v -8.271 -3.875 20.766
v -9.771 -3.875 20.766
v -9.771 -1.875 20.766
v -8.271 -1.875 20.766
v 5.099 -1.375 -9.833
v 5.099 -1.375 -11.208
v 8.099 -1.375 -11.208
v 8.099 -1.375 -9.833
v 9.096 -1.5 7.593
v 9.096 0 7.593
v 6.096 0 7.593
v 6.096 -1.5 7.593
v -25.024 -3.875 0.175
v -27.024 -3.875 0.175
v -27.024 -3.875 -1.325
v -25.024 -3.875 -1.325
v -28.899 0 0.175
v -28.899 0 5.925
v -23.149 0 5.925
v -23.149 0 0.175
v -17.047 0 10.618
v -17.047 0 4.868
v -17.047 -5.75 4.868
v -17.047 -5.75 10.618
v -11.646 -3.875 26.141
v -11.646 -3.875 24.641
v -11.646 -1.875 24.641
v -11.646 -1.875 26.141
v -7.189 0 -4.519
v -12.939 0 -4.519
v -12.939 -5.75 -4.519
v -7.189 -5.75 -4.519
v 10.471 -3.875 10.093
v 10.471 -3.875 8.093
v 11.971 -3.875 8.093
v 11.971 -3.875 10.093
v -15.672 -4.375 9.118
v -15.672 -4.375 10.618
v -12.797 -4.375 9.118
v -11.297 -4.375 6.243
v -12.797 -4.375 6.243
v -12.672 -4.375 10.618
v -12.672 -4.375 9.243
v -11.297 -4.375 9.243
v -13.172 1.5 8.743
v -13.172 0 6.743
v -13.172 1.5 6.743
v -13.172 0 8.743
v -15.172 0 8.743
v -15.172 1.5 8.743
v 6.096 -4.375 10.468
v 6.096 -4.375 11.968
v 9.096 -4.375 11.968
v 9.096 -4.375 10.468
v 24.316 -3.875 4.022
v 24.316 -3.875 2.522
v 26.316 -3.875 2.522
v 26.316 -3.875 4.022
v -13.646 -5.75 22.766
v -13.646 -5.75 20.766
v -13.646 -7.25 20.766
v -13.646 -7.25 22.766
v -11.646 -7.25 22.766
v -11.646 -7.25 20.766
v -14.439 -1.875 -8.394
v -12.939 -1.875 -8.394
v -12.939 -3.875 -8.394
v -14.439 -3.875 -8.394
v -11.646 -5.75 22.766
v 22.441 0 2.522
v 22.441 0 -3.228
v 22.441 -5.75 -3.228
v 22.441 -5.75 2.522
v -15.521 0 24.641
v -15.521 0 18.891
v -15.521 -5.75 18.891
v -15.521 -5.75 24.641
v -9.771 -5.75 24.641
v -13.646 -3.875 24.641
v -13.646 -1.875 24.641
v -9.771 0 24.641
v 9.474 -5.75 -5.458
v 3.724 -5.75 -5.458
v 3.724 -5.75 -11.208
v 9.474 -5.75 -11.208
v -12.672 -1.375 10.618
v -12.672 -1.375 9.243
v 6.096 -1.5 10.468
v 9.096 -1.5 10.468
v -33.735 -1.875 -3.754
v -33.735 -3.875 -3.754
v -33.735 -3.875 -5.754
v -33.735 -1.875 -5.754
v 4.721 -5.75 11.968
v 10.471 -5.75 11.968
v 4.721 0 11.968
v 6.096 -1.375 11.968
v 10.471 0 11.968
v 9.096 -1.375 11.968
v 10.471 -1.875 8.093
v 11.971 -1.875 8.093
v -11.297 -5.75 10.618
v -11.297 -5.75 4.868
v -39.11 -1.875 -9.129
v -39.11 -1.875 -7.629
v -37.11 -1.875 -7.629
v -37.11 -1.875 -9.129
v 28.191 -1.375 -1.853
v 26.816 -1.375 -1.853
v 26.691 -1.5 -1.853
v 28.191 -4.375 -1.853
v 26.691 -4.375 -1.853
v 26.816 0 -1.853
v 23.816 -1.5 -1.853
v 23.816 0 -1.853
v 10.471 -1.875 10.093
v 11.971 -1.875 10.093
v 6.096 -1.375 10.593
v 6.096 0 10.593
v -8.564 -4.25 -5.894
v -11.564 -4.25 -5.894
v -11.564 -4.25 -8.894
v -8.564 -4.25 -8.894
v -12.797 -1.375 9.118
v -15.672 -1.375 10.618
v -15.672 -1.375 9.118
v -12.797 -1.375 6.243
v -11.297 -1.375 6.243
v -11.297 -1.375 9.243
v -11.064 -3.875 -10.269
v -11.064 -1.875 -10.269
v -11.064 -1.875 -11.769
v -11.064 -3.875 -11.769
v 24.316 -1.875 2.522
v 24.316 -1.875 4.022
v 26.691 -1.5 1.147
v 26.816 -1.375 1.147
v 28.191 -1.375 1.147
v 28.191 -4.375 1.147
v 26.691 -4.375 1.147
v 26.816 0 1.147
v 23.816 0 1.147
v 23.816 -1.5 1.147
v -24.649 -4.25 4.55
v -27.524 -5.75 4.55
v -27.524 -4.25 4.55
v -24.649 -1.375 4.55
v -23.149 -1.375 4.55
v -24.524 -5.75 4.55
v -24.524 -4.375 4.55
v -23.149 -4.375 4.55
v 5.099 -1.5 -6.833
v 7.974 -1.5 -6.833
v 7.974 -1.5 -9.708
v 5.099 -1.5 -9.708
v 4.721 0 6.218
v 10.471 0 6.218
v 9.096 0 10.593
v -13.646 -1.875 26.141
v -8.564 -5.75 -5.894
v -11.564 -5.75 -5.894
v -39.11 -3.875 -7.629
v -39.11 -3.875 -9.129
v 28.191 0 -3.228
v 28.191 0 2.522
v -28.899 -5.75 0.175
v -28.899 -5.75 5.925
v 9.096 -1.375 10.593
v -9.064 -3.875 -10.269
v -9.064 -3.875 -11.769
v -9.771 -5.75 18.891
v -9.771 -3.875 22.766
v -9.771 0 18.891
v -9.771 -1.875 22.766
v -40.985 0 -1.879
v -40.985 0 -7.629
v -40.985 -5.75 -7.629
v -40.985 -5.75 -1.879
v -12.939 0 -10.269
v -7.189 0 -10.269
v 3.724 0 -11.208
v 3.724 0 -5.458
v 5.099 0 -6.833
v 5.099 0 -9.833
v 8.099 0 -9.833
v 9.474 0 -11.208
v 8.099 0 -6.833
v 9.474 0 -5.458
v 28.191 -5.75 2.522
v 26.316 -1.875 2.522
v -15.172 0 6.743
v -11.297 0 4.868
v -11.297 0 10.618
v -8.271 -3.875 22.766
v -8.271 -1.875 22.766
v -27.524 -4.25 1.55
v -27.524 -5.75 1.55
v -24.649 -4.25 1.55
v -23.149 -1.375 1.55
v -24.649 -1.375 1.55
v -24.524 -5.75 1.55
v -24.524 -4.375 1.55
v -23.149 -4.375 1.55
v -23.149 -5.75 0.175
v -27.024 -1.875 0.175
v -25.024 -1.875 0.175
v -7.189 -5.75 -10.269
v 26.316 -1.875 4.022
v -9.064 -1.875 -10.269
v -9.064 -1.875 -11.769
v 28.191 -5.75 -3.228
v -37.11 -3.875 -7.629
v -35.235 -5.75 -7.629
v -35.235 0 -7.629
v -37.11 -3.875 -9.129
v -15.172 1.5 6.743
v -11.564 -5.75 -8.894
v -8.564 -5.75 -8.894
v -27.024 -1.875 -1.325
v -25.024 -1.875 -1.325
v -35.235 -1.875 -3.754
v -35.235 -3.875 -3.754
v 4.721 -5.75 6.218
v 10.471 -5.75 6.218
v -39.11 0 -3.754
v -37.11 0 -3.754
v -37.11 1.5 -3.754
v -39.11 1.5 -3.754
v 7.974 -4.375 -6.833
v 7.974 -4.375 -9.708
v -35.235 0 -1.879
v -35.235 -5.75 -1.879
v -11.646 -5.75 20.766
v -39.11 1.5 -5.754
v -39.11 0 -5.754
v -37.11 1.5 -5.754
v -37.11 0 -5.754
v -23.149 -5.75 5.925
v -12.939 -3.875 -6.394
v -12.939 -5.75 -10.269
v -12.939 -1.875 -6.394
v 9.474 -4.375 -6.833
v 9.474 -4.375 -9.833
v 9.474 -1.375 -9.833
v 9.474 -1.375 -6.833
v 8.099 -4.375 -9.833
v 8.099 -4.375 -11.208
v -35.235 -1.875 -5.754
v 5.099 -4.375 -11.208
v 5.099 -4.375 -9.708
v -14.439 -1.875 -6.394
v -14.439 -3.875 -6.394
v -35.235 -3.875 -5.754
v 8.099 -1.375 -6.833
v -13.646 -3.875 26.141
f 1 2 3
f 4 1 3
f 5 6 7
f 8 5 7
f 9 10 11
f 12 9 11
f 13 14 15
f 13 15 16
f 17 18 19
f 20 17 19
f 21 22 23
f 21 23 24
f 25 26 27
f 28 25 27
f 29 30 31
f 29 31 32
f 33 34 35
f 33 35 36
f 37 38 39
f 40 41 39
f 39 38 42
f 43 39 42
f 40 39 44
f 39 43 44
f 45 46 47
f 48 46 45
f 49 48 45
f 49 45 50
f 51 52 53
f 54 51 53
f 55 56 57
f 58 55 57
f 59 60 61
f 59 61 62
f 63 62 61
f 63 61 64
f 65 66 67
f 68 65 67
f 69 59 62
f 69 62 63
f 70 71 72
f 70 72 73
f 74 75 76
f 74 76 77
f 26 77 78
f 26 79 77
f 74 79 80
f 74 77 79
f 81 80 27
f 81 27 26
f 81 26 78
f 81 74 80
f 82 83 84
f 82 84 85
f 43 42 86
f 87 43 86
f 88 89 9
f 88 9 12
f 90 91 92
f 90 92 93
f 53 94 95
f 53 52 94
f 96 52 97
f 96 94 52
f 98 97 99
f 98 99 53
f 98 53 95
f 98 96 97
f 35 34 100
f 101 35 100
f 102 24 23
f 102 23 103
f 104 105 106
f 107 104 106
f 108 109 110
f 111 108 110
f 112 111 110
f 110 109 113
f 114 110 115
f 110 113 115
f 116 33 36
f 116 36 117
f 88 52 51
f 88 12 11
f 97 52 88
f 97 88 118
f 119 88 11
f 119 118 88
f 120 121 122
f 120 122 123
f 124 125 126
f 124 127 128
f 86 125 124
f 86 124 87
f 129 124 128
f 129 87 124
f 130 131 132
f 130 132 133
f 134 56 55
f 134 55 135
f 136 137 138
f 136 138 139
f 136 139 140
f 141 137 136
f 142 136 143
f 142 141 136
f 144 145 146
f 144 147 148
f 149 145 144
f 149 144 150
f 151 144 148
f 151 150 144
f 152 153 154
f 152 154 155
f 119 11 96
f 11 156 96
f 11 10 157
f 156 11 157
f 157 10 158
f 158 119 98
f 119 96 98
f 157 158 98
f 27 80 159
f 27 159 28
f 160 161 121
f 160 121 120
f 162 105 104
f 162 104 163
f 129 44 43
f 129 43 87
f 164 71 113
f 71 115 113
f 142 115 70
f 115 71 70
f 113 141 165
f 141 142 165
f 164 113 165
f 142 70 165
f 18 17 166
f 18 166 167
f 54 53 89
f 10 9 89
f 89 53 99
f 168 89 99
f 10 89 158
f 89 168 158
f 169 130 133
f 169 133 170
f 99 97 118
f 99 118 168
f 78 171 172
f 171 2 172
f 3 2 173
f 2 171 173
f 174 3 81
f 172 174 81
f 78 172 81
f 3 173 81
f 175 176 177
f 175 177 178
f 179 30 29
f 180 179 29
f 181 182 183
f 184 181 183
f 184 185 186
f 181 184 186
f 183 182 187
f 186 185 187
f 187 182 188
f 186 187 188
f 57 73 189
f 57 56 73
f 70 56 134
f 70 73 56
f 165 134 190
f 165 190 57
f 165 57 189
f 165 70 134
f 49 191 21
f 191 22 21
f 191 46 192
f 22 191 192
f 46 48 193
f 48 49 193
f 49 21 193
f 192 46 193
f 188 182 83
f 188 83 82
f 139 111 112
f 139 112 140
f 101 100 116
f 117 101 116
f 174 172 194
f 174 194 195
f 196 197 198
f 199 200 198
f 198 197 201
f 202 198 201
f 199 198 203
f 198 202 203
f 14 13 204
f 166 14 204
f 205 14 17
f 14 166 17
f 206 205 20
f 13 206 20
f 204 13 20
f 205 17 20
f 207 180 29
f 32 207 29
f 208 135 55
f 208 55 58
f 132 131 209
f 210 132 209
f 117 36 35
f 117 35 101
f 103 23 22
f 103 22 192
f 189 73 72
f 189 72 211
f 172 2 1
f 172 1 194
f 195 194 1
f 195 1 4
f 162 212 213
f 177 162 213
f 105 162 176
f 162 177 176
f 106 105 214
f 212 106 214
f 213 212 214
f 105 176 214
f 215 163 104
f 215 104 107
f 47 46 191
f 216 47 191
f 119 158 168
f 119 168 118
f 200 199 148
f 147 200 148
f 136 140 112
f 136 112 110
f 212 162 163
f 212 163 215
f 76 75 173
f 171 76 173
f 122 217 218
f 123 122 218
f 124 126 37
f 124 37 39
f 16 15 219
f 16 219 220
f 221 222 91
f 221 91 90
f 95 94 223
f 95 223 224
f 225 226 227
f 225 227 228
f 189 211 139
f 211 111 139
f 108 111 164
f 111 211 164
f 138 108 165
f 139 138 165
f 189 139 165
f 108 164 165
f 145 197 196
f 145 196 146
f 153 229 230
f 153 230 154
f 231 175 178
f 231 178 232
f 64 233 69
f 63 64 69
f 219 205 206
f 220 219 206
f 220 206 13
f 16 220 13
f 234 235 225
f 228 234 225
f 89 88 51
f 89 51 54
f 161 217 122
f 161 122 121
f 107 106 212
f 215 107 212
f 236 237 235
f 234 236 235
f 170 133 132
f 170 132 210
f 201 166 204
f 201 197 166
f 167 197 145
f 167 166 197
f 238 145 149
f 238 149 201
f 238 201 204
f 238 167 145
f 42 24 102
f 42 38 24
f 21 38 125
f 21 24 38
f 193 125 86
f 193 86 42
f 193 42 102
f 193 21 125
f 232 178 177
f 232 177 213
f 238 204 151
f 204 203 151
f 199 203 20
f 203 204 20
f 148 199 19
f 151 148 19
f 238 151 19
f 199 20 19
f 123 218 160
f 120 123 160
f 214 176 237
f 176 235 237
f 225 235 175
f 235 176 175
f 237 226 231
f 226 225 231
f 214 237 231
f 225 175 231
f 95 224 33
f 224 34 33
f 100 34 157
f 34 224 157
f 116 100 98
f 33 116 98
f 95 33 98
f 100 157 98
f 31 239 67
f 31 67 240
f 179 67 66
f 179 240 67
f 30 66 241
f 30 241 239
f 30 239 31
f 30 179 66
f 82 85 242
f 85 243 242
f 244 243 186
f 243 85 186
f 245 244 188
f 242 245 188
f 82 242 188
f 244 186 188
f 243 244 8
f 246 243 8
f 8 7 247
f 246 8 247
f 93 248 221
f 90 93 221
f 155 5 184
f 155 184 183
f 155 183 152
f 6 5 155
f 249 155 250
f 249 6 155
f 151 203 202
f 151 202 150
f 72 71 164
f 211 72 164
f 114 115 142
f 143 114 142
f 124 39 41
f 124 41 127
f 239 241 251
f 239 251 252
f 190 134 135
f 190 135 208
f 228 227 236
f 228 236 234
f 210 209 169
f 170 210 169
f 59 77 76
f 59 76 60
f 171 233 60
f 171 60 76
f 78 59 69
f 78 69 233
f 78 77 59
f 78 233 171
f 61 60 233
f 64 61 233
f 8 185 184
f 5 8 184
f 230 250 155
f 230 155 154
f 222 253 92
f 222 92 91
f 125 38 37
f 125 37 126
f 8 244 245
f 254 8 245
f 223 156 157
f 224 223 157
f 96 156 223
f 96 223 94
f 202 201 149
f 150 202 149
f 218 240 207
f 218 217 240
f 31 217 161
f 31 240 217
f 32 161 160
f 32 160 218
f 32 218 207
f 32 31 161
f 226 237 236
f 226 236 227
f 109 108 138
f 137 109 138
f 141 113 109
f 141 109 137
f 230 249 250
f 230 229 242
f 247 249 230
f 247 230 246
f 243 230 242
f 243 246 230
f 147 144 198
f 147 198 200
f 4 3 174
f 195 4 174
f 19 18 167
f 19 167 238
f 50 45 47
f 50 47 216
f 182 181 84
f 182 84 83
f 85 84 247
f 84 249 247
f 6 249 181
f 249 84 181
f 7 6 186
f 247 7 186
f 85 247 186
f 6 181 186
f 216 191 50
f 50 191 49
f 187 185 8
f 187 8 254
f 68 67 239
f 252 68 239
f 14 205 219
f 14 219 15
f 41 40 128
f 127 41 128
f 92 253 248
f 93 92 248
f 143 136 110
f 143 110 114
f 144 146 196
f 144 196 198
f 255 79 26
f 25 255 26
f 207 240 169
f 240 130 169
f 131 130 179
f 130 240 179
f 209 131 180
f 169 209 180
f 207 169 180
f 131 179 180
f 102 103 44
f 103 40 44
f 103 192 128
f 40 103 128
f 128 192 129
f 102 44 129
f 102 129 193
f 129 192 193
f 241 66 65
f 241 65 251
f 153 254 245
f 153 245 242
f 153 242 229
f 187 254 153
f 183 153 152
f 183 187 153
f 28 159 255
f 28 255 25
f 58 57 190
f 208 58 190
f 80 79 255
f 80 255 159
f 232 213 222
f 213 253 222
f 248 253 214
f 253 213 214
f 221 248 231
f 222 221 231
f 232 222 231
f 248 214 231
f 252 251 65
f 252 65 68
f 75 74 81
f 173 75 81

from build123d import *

# Parameters (mm, degrees)
F0_W      = 5.75
F0_H      = 5.75
F1_DEPTH  = 5.75
F2_W      = 3
F2_H      = 3
F4_DEPTH  = 1.5
F3_W      = 2
F3_H      = 2
F5_DEPTH  = 1.5
F6_W      = 3
F6_H      = 3
F7_DEPTH  = 1.5
F8_W      = 2
F8_H      = 2
F9_DEPTH  = 1.5
F10_W     = 2
F10_H     = 2
F11_DEPTH = 1.5
F12_W     = 2
F12_H     = 2
F13_DEPTH = 1.5
F14_W     = 3
F14_H     = 3
F15_DEPTH = 1.5
F16_W     = 2
F16_H     = 2
F17_DEPTH = 1.5
F18_W     = 2
F18_H     = 2
F19_DEPTH = 1.5
F20_W     = 3
F20_H     = 3
F21_DEPTH = 1.5
F22_W     = 3
F22_H     = 3
F23_DEPTH = 1.5
F24_DEPTH = 1.5
F25_W     = 2
F25_H     = 2
F26_DEPTH = 1.5
F28_W     = 2
F28_H     = 2
F29_DEPTH = 1.5
F27_W     = 2
F27_H     = 2
F30_DEPTH = 1.5
F31_W     = 2
F31_H     = 2
F32_DEPTH = 1.5
F33_W     = 3
F33_H     = 3
F34_DEPTH = 1.5
F35_W     = 3
F35_H     = 3
F36_DEPTH = 1.5
F37_W     = 2
F37_H     = 2
F38_DEPTH = 1.5
F39_W     = 2
F39_H     = 2
F40_DEPTH = 1.5
F41_W     = 3
F41_H     = 3
F42_DEPTH = 1.5
F43_W     = 3
F43_H     = 3
F44_DEPTH = 1.5
F45_W     = 3
F45_H     = 3
F46_DEPTH = 1.5
F47_W     = 3
F47_H     = 3
F48_DEPTH = 1.5
F49_W     = 3
F49_H     = 3
F50_DEPTH = 1.5


# Not quite as in the source:
# - a feature names something its author has since deleted; it is built from what else it names


with BuildPart() as f1:
    # F0 (on Front) → F1 (new body)
    with BuildSketch(Plane.XZ):
        with Locations((-12.646038468, 21.76645218)):
            Rectangle(F0_W, F0_H)
    extrude(amount=F1_DEPTH)

    # F22 (on face) → F24 (cut)
    with BuildSketch(Plane(origin=(0, 0, 0), x_dir=(-1, 0, 0), z_dir=(0, 1, 0))):
        with Locations((-25.3156977051, -0.3534462649)):
            Rectangle(F22_W, F22_H)
    extrude(amount=-F24_DEPTH, mode=Mode.SUBTRACT)

    # F28 (on face) → F29 (join)
    with BuildSketch(Plane.XY.offset(24.64145218)):
        with Locations((-12.646038468, -2.875)):
            Rectangle(F28_W, F28_H)
    extrude(amount=F29_DEPTH)

    # F27 (on face) → F30 (join)
    with BuildSketch(Plane.XZ.offset(5.75)):
        with Locations((-12.646038468, 21.76645218)):
            Rectangle(F27_W, F27_H)
    extrude(amount=F30_DEPTH)

    # F31 (on face) → F32 (join)
    with BuildSketch(Plane.YZ.offset(-9.771038468)):
        with Locations((-2.875, 21.76645218)):
            Rectangle(F31_W, F31_H)
    extrude(amount=F32_DEPTH)


with BuildPart() as f1b:
    # F0 (on Front) → F1, piece 2 (new body)
    with BuildSketch(Plane.XZ):
        with Locations((-14.1715484071, 7.7434927479)):
            Rectangle(F0_W, F0_H)
    extrude(amount=F1_DEPTH)

    # F39 (on face) → F40 (join)
    with BuildSketch(Plane(origin=(0, 0, 0), x_dir=(-1, 0, 0), z_dir=(0, 1, 0))):
        with Locations((14.1715484071, 7.7434927479)):
            Rectangle(F39_W, F39_H)
    extrude(amount=F40_DEPTH)

    # F41 (on face) → F42 (cut)
    with BuildSketch(Plane.XY.offset(10.6184927479)):
        with Locations((-14.1715484071, -2.875)):
            Rectangle(F41_W, F41_H)
    extrude(amount=-F42_DEPTH, mode=Mode.SUBTRACT)

    # F43 (on face) → F44 (cut)
    with BuildSketch(Plane.YZ.offset(-11.2965484071)):
        with Locations((-2.875, 7.7434927479)):
            Rectangle(F43_W, F43_H)
    extrude(amount=-F44_DEPTH, mode=Mode.SUBTRACT)


with BuildPart() as f1c:
    # F0 (on Front) → F1, piece 3 (new body)
    with BuildSketch(Plane.XZ):
        with Locations((-26.0235892455, 3.0496152631)):
            Rectangle(F0_W, F0_H)
    extrude(amount=F1_DEPTH)

    # F2 (on face) → F4 (cut)
    with BuildSketch(Plane.XZ.offset(5.75)):
        with Locations((-26.0235892455, 3.0496152631)):
            Rectangle(F2_W, F2_H)
    extrude(amount=-F4_DEPTH, mode=Mode.SUBTRACT)

    # F3 (on face) → F5 (join)
    with BuildSketch(Plane(origin=(0, 0, 0.1746152631), x_dir=(1, 0, 0), z_dir=(0, 0, -1))):
        with Locations((-26.0235892455, 2.875)):
            Rectangle(F3_W, F3_H)
    extrude(amount=F5_DEPTH)

    # F6 (on face) → F7 (cut)
    with BuildSketch(Plane.YZ.offset(-23.1485892455)):
        with Locations((-2.875, 3.0496152631)):
            Rectangle(F6_W, F6_H)
    extrude(amount=-F7_DEPTH, mode=Mode.SUBTRACT)


with BuildPart() as f1d:
    # F0 (on Front) → F1, piece 4 (new body)
    with BuildSketch(Plane.XZ):
        with Locations((-38.1103243368, -4.7539562041)):
            Rectangle(F0_W, F0_H)
    extrude(amount=F1_DEPTH)

    # F8 (on face) → F9 (join)
    with BuildSketch(Plane(origin=(0, 0, 0), x_dir=(-1, 0, 0), z_dir=(0, 1, 0))):
        with Locations((38.1103243368, -4.7539562041)):
            Rectangle(F8_W, F8_H)
    extrude(amount=F9_DEPTH)

    # F10 (on face) → F11 (join)
    with BuildSketch(Plane.YZ.offset(-35.2353243368)):
        with Locations((-2.875, -4.7539562041)):
            Rectangle(F10_W, F10_H)
    extrude(amount=F11_DEPTH)

    # F12 (on face) → F13 (join)
    with BuildSketch(Plane(origin=(0, 0, -7.6289562041), x_dir=(1, 0, 0), z_dir=(0, 0, -1))):
        with Locations((-38.1103243368, 2.875)):
            Rectangle(F12_W, F12_H)
    extrude(amount=F13_DEPTH)


with BuildPart() as f1e:
    # F0 (on Front) → F1, piece 5 (new body)
    with BuildSketch(Plane.XZ):
        with Locations((-10.0644060136, -7.3942619512)):
            Rectangle(F0_W, F0_H)
    extrude(amount=F1_DEPTH)

    # F14 (on face) → F15 (cut)
    with BuildSketch(Plane.XZ.offset(5.75)):
        with Locations((-10.0644060136, -7.3942619512)):
            Rectangle(F14_W, F14_H)
    extrude(amount=-F15_DEPTH, mode=Mode.SUBTRACT)

    # F16 (on face) → F17 (join)
    with BuildSketch(Plane(origin=(0, 0, -10.2692619512), x_dir=(1, 0, 0), z_dir=(0, 0, -1))):
        with Locations((-10.0644060136, 2.875)):
            Rectangle(F16_W, F16_H)
    extrude(amount=F17_DEPTH)

    # F18 (on face) → F19 (join)
    with BuildSketch(Plane(origin=(-12.9394060136, 0, 0), x_dir=(0, -1, 0), z_dir=(-1, 0, 0))):
        with Locations((2.875, -7.3942619512)):
            Rectangle(F18_W, F18_H)
    extrude(amount=F19_DEPTH)


with BuildPart() as f1f:
    # F0 (on Front) → F1, piece 6 (new body)
    with BuildSketch(Plane.XZ):
        with Locations((6.5988599769, -8.3330389627)):
            Rectangle(F0_W, F0_H)
    extrude(amount=F1_DEPTH)

    # F45 (on face) → F46 (cut)
    with BuildSketch(Plane.YZ.offset(9.4738599769)):
        with Locations((-2.875, -8.3330389627)):
            Rectangle(F45_W, F45_H)
    extrude(amount=-F46_DEPTH, mode=Mode.SUBTRACT)

    # F47 (on face) → F48 (cut)
    with BuildSketch(Plane(origin=(0, 0, 0), x_dir=(-1, 0, 0), z_dir=(0, 1, 0))):
        with Locations((-6.5988599769, -8.3330389627)):
            Rectangle(F47_W, F47_H)
    extrude(amount=-F48_DEPTH, mode=Mode.SUBTRACT)

    # F49 (on face) → F50 (cut)
    with BuildSketch(Plane(origin=(0, 0, -11.2080389627), x_dir=(1, 0, 0), z_dir=(0, 0, -1))):
        with Locations((6.5988599769, 2.875)):
            Rectangle(F49_W, F49_H)
    extrude(amount=-F50_DEPTH, mode=Mode.SUBTRACT)


with BuildPart() as f1g:
    # F0 (on Front) → F1, piece 7 (new body)
    with BuildSketch(Plane.XZ):
        with Locations((7.5963086585, 9.0929825383)):
            Rectangle(F0_W, F0_H)
    extrude(amount=F1_DEPTH)

    # F33 (on face) → F34 (cut)
    with BuildSketch(Plane.XY.offset(11.9679825383)):
        with Locations((7.5963086585, -2.875)):
            Rectangle(F33_W, F33_H)
    extrude(amount=-F34_DEPTH, mode=Mode.SUBTRACT)

    # F35 (on face) → F36 (cut)
    with BuildSketch(Plane(origin=(0, 0, 0), x_dir=(-1, 0, 0), z_dir=(0, 1, 0))):
        with Locations((-7.5963086585, 9.0929825383)):
            Rectangle(F35_W, F35_H)
    extrude(amount=-F36_DEPTH, mode=Mode.SUBTRACT)

    # F37 (on face) → F38 (join)
    with BuildSketch(Plane.YZ.offset(10.4713086585)):
        with Locations((-2.875, 9.0929825383)):
            Rectangle(F37_W, F37_H)
    extrude(amount=F38_DEPTH)


with BuildPart() as f1h:
    # F0 (on Front) → F1, piece 8 (new body)
    with BuildSketch(Plane.XZ):
        with Locations((25.3156977051, -0.3534462649)):
            Rectangle(F0_W, F0_H)
    extrude(amount=F1_DEPTH)

    # F20 (on face) → F21 (cut)
    with BuildSketch(Plane.YZ.offset(28.1906977051)):
        with Locations((-2.875, -0.3534462649)):
            Rectangle(F20_W, F20_H)
    extrude(amount=-F21_DEPTH, mode=Mode.SUBTRACT)

    # F22 (on face) → F23 (cut)
    with BuildSketch(Plane(origin=(0, 0, 0), x_dir=(-1, 0, 0), z_dir=(0, 1, 0))):
        with Locations((-25.3156977051, -0.3534462649)):
            Rectangle(F22_W, F22_H)
    extrude(amount=-F23_DEPTH, mode=Mode.SUBTRACT)

    # F25 (on face) → F26 (join)
    with BuildSketch(Plane.XY.offset(2.5215537351)):
        with Locations((25.3156977051, -2.875)):
            Rectangle(F25_W, F25_H)
    extrude(amount=F26_DEPTH)


solid = Compound([f1.part, f1b.part, f1c.part, f1d.part, f1e.part, f1f.part, f1g.part, f1h.part])
